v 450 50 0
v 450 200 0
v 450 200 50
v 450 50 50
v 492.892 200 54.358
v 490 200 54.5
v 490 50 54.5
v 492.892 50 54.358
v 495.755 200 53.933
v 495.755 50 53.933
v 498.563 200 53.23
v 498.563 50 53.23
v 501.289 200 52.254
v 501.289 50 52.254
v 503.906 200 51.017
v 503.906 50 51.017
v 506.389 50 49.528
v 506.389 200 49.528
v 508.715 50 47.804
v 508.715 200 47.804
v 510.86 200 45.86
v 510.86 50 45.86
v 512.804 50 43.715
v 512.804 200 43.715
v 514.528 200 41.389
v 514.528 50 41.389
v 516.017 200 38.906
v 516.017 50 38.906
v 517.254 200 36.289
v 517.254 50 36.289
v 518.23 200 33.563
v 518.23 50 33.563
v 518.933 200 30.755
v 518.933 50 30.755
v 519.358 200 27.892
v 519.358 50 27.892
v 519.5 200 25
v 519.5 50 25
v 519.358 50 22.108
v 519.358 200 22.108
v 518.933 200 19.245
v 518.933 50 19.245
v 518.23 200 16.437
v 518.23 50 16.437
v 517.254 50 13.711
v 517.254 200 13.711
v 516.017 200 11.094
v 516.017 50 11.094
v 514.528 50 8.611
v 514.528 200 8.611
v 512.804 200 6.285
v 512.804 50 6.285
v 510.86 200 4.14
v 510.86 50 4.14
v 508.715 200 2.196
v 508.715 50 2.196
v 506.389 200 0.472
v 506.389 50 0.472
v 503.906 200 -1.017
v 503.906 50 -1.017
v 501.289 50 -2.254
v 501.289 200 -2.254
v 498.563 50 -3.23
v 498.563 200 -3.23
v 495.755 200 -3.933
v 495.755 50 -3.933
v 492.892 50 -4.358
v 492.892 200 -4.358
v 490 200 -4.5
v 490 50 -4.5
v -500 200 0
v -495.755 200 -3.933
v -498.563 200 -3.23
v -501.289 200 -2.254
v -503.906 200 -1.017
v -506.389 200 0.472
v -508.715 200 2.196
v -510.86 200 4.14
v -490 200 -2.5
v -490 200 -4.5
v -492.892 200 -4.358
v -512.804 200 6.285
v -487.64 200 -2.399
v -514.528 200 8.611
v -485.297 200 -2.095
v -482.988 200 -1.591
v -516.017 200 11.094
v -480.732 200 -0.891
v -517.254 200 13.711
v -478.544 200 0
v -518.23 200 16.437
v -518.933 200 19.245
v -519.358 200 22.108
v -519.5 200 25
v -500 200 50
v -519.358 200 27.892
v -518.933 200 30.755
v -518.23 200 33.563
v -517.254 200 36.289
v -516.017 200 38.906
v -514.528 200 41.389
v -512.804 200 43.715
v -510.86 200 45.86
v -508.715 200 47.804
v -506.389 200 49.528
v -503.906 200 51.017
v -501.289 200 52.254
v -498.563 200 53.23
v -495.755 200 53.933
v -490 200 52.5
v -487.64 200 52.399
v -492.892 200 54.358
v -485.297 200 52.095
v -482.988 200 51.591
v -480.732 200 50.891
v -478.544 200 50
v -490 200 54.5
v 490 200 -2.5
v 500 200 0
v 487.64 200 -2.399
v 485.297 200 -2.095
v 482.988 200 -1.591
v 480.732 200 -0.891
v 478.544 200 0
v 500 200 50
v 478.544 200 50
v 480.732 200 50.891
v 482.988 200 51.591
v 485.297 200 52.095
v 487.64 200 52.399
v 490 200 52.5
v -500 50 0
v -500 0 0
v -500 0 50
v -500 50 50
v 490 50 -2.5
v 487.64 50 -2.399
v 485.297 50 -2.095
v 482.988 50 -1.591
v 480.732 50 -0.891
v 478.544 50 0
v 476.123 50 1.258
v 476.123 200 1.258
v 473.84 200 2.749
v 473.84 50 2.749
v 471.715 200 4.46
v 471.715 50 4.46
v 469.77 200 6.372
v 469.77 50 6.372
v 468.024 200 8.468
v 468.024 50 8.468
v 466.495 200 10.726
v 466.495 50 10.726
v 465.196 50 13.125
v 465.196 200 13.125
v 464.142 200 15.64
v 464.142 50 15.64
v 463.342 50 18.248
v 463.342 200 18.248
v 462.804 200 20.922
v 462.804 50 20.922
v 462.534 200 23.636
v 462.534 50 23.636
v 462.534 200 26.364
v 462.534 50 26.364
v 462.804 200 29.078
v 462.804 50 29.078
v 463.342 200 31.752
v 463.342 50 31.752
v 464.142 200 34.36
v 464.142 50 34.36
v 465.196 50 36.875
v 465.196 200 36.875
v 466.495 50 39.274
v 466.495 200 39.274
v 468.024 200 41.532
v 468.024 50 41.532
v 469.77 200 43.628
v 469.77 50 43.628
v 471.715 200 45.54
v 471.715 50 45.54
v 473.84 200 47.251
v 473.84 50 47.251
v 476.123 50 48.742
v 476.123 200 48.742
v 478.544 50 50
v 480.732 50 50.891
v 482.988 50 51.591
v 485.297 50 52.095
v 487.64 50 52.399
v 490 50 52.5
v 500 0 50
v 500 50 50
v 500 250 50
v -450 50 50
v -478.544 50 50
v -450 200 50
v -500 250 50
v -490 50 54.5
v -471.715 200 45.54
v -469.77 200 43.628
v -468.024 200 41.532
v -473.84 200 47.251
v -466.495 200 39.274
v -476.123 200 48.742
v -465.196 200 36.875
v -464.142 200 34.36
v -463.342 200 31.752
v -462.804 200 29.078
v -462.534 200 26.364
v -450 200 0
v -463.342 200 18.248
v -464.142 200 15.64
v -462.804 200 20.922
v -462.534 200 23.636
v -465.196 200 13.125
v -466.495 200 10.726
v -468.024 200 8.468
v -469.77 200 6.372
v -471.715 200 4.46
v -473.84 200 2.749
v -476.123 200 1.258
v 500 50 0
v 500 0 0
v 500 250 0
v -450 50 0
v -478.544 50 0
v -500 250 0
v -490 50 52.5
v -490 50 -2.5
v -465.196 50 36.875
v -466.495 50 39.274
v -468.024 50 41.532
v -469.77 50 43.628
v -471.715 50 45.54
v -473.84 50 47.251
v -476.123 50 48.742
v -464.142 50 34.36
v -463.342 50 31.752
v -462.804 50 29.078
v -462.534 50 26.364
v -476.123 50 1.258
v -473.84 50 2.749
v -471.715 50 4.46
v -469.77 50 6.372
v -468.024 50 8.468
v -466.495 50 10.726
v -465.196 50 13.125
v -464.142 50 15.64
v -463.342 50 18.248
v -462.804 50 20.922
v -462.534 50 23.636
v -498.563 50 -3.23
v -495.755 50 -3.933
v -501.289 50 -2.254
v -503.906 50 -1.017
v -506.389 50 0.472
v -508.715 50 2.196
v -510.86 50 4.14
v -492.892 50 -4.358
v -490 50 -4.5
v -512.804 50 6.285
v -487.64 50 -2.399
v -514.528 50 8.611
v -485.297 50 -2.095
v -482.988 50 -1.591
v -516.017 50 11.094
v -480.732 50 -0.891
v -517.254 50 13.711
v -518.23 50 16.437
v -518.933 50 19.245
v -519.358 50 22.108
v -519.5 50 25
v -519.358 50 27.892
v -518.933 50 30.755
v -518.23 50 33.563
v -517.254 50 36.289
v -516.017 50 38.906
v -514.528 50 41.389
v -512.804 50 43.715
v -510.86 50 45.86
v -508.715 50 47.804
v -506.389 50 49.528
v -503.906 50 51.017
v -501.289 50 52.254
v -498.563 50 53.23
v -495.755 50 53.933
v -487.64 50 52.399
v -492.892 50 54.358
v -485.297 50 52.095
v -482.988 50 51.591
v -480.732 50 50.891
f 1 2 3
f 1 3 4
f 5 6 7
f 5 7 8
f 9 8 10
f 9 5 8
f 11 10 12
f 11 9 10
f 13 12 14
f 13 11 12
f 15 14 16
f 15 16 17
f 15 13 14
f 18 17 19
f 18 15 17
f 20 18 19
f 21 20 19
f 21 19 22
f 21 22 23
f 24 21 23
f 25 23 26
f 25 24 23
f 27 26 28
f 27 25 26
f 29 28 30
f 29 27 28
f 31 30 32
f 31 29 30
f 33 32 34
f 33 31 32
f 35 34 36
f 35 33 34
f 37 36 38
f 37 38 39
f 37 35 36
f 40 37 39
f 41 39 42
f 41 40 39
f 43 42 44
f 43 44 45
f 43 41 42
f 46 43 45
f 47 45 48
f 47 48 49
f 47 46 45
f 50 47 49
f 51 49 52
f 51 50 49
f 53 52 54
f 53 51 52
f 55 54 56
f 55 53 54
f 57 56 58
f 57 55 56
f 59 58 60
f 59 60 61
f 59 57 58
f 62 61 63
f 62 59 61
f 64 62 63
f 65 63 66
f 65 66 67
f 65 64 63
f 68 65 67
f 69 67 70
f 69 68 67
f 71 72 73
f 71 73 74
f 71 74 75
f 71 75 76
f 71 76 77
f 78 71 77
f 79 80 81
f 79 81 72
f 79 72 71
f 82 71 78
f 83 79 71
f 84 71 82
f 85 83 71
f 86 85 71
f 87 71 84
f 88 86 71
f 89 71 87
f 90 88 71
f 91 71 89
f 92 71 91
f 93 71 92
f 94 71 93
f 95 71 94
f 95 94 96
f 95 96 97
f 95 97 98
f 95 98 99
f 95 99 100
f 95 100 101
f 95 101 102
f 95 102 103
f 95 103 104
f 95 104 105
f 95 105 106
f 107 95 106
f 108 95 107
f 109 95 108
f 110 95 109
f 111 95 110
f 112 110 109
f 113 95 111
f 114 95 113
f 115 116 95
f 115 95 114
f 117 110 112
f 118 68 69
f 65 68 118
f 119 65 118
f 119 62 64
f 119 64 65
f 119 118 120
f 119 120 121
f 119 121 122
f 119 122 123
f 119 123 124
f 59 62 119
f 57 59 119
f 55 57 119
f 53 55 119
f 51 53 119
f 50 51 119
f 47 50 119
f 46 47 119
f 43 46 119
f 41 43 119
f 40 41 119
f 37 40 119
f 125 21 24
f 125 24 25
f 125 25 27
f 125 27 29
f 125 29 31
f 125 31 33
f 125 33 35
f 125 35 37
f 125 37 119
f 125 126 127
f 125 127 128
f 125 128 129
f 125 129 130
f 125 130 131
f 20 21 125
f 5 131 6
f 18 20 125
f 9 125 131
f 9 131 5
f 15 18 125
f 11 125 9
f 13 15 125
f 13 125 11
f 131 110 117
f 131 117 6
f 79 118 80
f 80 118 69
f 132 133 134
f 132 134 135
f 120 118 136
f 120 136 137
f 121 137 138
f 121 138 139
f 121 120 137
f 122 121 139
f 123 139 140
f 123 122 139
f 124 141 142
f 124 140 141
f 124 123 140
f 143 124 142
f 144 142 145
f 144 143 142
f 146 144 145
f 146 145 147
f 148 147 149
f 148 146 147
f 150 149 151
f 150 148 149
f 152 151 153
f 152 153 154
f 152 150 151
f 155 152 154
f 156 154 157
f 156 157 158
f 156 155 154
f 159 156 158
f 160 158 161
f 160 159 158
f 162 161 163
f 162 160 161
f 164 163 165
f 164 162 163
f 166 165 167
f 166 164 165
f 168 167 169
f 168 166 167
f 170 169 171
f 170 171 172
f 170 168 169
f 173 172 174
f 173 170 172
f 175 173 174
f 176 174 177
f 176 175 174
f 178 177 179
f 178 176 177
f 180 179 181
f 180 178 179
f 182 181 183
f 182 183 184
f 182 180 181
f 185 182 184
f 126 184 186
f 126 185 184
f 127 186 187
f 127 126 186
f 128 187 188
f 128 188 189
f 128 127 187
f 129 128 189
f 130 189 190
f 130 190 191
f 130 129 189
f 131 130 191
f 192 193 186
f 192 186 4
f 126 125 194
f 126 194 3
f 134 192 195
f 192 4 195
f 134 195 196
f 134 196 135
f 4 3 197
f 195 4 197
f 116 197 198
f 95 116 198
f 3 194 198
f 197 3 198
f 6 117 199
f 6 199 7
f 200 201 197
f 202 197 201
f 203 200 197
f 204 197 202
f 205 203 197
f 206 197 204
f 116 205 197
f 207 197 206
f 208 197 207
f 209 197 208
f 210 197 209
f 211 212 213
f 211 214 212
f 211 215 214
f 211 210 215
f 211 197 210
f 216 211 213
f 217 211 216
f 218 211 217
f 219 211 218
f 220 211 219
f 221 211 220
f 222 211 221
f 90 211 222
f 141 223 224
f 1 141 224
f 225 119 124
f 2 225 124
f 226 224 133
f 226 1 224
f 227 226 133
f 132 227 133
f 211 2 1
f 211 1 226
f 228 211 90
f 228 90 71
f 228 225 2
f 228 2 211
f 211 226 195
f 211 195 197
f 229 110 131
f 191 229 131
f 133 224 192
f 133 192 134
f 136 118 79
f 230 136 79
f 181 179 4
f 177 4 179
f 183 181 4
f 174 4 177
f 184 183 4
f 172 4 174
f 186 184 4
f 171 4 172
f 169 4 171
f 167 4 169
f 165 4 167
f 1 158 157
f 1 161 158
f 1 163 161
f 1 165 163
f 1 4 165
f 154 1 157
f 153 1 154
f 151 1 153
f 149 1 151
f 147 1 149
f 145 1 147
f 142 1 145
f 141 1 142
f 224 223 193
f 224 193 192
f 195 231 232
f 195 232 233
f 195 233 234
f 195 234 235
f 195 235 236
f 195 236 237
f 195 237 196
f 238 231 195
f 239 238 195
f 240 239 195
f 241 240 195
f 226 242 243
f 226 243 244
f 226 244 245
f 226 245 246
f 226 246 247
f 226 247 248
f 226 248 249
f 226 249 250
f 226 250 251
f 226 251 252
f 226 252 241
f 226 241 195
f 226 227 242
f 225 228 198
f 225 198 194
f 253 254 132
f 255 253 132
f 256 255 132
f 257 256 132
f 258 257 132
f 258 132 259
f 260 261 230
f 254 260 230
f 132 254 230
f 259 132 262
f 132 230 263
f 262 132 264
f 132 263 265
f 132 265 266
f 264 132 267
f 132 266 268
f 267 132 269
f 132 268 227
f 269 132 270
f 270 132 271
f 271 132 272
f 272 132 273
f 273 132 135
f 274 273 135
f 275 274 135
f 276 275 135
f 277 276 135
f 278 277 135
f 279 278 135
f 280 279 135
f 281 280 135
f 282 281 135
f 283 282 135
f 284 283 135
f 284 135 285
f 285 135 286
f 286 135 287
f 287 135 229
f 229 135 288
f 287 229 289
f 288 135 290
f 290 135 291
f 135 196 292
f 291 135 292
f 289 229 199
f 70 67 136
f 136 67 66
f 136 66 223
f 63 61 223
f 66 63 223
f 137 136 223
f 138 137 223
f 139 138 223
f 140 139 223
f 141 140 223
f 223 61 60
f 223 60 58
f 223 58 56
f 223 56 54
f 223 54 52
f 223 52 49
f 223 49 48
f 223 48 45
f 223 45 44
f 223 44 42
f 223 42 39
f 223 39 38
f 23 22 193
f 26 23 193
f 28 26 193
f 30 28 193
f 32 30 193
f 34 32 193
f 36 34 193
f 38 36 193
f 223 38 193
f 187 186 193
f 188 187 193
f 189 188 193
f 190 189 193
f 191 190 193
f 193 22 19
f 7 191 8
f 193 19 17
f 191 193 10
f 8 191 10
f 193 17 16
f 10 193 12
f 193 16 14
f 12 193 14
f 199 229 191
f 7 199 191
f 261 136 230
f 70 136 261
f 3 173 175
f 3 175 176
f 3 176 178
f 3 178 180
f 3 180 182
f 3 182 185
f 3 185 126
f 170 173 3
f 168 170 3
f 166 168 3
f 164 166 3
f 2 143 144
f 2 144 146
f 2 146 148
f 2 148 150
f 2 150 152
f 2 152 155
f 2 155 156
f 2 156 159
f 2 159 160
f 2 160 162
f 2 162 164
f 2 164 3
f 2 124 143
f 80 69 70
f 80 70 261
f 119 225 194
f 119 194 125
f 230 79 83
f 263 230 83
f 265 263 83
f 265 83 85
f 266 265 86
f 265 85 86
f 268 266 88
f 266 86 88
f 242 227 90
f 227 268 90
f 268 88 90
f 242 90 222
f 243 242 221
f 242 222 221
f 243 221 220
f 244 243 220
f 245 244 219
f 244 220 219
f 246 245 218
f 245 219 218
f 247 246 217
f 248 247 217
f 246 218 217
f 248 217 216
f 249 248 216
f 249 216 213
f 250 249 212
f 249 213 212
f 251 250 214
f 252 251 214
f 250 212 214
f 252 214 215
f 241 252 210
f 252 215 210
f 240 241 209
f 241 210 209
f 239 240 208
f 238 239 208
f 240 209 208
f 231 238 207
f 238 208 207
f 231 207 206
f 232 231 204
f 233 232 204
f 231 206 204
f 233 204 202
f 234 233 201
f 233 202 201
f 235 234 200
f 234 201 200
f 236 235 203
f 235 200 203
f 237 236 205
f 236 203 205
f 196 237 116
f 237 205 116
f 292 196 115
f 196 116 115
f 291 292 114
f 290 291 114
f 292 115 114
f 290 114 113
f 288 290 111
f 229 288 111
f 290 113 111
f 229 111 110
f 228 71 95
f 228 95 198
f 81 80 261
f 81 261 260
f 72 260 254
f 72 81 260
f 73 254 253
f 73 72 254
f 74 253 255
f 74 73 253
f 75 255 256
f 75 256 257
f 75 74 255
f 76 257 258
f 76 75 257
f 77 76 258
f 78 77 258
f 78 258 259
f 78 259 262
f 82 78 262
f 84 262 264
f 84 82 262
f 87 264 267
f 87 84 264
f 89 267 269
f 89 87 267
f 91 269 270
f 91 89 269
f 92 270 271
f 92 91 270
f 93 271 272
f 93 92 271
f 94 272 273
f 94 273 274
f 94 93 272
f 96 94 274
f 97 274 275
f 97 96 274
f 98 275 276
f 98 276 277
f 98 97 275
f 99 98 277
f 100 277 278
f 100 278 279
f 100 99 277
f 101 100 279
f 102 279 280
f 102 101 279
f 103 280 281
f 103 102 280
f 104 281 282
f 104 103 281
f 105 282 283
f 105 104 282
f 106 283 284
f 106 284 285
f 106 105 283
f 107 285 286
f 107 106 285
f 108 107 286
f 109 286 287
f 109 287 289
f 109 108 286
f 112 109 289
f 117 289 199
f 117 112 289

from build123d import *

# Parameters (mm, degrees)
BOSS_EXTRUDE2_DEPTH = 50
SKETCH2_R           = 27.5
BOSS_EXTRUDE3_DEPTH = 150
BOSS_EXTRUDE4_START = -150
BOSS_EXTRUDE4_DEPTH = 150


with BuildPart() as part:
    # Sketch1 → Boss-Extrude2 (new body)
    with BuildSketch(Plane.XY):
        Polygon((-500, 250), (500, 250), (500, 200), (450, 200), (450, 50), (500, 50), (500, 0), (-500, 0), (-500, 50), (-450, 50), (-450, 200), (-500, 200), align=None)
    extrude(amount=BOSS_EXTRUDE2_DEPTH)

    # Sketch2 → Boss-Extrude3 (add)
    with BuildSketch(Plane.XZ.offset(-200)):
        with Locations(Location((-490, 25, 0), (0, 0, 65.380022671))):
            Circle(SKETCH2_R)
    boss_extrude3 = extrude(amount=BOSS_EXTRUDE3_DEPTH)

    # Mirror1: Boss-Extrude3 across plane
    add(boss_extrude3.mirror(Plane(origin=(0, 0, 0), x_dir=(0, 0, 1), z_dir=(1, 0, 0))))

    # Sketch3 → Boss-Extrude4 (add)
    with BuildSketch(Plane.XZ.offset(-50).offset(BOSS_EXTRUDE4_START)):
        with BuildLine():
            Line((-490, 54.5), (490, 54.5))
            ThreePointArc((490, 54.5), (519.5, 25), (490, -4.5))
            Line((490, -4.5), (-490, -4.5))
            ThreePointArc((-490, -4.5), (-519.5, 25), (-490, 54.5))
        make_face()
        with BuildLine():
            Line((-490, 52.5), (490, 52.5))
            ThreePointArc((490, 52.5), (517.5, 25), (490, -2.5))
            Line((490, -2.5), (-490, -2.5))
            ThreePointArc((-490, -2.5), (-517.5, 25), (-490, 52.5))
        make_face(mode=Mode.SUBTRACT)
    extrude(amount=BOSS_EXTRUDE4_DEPTH)


solid = part.part
